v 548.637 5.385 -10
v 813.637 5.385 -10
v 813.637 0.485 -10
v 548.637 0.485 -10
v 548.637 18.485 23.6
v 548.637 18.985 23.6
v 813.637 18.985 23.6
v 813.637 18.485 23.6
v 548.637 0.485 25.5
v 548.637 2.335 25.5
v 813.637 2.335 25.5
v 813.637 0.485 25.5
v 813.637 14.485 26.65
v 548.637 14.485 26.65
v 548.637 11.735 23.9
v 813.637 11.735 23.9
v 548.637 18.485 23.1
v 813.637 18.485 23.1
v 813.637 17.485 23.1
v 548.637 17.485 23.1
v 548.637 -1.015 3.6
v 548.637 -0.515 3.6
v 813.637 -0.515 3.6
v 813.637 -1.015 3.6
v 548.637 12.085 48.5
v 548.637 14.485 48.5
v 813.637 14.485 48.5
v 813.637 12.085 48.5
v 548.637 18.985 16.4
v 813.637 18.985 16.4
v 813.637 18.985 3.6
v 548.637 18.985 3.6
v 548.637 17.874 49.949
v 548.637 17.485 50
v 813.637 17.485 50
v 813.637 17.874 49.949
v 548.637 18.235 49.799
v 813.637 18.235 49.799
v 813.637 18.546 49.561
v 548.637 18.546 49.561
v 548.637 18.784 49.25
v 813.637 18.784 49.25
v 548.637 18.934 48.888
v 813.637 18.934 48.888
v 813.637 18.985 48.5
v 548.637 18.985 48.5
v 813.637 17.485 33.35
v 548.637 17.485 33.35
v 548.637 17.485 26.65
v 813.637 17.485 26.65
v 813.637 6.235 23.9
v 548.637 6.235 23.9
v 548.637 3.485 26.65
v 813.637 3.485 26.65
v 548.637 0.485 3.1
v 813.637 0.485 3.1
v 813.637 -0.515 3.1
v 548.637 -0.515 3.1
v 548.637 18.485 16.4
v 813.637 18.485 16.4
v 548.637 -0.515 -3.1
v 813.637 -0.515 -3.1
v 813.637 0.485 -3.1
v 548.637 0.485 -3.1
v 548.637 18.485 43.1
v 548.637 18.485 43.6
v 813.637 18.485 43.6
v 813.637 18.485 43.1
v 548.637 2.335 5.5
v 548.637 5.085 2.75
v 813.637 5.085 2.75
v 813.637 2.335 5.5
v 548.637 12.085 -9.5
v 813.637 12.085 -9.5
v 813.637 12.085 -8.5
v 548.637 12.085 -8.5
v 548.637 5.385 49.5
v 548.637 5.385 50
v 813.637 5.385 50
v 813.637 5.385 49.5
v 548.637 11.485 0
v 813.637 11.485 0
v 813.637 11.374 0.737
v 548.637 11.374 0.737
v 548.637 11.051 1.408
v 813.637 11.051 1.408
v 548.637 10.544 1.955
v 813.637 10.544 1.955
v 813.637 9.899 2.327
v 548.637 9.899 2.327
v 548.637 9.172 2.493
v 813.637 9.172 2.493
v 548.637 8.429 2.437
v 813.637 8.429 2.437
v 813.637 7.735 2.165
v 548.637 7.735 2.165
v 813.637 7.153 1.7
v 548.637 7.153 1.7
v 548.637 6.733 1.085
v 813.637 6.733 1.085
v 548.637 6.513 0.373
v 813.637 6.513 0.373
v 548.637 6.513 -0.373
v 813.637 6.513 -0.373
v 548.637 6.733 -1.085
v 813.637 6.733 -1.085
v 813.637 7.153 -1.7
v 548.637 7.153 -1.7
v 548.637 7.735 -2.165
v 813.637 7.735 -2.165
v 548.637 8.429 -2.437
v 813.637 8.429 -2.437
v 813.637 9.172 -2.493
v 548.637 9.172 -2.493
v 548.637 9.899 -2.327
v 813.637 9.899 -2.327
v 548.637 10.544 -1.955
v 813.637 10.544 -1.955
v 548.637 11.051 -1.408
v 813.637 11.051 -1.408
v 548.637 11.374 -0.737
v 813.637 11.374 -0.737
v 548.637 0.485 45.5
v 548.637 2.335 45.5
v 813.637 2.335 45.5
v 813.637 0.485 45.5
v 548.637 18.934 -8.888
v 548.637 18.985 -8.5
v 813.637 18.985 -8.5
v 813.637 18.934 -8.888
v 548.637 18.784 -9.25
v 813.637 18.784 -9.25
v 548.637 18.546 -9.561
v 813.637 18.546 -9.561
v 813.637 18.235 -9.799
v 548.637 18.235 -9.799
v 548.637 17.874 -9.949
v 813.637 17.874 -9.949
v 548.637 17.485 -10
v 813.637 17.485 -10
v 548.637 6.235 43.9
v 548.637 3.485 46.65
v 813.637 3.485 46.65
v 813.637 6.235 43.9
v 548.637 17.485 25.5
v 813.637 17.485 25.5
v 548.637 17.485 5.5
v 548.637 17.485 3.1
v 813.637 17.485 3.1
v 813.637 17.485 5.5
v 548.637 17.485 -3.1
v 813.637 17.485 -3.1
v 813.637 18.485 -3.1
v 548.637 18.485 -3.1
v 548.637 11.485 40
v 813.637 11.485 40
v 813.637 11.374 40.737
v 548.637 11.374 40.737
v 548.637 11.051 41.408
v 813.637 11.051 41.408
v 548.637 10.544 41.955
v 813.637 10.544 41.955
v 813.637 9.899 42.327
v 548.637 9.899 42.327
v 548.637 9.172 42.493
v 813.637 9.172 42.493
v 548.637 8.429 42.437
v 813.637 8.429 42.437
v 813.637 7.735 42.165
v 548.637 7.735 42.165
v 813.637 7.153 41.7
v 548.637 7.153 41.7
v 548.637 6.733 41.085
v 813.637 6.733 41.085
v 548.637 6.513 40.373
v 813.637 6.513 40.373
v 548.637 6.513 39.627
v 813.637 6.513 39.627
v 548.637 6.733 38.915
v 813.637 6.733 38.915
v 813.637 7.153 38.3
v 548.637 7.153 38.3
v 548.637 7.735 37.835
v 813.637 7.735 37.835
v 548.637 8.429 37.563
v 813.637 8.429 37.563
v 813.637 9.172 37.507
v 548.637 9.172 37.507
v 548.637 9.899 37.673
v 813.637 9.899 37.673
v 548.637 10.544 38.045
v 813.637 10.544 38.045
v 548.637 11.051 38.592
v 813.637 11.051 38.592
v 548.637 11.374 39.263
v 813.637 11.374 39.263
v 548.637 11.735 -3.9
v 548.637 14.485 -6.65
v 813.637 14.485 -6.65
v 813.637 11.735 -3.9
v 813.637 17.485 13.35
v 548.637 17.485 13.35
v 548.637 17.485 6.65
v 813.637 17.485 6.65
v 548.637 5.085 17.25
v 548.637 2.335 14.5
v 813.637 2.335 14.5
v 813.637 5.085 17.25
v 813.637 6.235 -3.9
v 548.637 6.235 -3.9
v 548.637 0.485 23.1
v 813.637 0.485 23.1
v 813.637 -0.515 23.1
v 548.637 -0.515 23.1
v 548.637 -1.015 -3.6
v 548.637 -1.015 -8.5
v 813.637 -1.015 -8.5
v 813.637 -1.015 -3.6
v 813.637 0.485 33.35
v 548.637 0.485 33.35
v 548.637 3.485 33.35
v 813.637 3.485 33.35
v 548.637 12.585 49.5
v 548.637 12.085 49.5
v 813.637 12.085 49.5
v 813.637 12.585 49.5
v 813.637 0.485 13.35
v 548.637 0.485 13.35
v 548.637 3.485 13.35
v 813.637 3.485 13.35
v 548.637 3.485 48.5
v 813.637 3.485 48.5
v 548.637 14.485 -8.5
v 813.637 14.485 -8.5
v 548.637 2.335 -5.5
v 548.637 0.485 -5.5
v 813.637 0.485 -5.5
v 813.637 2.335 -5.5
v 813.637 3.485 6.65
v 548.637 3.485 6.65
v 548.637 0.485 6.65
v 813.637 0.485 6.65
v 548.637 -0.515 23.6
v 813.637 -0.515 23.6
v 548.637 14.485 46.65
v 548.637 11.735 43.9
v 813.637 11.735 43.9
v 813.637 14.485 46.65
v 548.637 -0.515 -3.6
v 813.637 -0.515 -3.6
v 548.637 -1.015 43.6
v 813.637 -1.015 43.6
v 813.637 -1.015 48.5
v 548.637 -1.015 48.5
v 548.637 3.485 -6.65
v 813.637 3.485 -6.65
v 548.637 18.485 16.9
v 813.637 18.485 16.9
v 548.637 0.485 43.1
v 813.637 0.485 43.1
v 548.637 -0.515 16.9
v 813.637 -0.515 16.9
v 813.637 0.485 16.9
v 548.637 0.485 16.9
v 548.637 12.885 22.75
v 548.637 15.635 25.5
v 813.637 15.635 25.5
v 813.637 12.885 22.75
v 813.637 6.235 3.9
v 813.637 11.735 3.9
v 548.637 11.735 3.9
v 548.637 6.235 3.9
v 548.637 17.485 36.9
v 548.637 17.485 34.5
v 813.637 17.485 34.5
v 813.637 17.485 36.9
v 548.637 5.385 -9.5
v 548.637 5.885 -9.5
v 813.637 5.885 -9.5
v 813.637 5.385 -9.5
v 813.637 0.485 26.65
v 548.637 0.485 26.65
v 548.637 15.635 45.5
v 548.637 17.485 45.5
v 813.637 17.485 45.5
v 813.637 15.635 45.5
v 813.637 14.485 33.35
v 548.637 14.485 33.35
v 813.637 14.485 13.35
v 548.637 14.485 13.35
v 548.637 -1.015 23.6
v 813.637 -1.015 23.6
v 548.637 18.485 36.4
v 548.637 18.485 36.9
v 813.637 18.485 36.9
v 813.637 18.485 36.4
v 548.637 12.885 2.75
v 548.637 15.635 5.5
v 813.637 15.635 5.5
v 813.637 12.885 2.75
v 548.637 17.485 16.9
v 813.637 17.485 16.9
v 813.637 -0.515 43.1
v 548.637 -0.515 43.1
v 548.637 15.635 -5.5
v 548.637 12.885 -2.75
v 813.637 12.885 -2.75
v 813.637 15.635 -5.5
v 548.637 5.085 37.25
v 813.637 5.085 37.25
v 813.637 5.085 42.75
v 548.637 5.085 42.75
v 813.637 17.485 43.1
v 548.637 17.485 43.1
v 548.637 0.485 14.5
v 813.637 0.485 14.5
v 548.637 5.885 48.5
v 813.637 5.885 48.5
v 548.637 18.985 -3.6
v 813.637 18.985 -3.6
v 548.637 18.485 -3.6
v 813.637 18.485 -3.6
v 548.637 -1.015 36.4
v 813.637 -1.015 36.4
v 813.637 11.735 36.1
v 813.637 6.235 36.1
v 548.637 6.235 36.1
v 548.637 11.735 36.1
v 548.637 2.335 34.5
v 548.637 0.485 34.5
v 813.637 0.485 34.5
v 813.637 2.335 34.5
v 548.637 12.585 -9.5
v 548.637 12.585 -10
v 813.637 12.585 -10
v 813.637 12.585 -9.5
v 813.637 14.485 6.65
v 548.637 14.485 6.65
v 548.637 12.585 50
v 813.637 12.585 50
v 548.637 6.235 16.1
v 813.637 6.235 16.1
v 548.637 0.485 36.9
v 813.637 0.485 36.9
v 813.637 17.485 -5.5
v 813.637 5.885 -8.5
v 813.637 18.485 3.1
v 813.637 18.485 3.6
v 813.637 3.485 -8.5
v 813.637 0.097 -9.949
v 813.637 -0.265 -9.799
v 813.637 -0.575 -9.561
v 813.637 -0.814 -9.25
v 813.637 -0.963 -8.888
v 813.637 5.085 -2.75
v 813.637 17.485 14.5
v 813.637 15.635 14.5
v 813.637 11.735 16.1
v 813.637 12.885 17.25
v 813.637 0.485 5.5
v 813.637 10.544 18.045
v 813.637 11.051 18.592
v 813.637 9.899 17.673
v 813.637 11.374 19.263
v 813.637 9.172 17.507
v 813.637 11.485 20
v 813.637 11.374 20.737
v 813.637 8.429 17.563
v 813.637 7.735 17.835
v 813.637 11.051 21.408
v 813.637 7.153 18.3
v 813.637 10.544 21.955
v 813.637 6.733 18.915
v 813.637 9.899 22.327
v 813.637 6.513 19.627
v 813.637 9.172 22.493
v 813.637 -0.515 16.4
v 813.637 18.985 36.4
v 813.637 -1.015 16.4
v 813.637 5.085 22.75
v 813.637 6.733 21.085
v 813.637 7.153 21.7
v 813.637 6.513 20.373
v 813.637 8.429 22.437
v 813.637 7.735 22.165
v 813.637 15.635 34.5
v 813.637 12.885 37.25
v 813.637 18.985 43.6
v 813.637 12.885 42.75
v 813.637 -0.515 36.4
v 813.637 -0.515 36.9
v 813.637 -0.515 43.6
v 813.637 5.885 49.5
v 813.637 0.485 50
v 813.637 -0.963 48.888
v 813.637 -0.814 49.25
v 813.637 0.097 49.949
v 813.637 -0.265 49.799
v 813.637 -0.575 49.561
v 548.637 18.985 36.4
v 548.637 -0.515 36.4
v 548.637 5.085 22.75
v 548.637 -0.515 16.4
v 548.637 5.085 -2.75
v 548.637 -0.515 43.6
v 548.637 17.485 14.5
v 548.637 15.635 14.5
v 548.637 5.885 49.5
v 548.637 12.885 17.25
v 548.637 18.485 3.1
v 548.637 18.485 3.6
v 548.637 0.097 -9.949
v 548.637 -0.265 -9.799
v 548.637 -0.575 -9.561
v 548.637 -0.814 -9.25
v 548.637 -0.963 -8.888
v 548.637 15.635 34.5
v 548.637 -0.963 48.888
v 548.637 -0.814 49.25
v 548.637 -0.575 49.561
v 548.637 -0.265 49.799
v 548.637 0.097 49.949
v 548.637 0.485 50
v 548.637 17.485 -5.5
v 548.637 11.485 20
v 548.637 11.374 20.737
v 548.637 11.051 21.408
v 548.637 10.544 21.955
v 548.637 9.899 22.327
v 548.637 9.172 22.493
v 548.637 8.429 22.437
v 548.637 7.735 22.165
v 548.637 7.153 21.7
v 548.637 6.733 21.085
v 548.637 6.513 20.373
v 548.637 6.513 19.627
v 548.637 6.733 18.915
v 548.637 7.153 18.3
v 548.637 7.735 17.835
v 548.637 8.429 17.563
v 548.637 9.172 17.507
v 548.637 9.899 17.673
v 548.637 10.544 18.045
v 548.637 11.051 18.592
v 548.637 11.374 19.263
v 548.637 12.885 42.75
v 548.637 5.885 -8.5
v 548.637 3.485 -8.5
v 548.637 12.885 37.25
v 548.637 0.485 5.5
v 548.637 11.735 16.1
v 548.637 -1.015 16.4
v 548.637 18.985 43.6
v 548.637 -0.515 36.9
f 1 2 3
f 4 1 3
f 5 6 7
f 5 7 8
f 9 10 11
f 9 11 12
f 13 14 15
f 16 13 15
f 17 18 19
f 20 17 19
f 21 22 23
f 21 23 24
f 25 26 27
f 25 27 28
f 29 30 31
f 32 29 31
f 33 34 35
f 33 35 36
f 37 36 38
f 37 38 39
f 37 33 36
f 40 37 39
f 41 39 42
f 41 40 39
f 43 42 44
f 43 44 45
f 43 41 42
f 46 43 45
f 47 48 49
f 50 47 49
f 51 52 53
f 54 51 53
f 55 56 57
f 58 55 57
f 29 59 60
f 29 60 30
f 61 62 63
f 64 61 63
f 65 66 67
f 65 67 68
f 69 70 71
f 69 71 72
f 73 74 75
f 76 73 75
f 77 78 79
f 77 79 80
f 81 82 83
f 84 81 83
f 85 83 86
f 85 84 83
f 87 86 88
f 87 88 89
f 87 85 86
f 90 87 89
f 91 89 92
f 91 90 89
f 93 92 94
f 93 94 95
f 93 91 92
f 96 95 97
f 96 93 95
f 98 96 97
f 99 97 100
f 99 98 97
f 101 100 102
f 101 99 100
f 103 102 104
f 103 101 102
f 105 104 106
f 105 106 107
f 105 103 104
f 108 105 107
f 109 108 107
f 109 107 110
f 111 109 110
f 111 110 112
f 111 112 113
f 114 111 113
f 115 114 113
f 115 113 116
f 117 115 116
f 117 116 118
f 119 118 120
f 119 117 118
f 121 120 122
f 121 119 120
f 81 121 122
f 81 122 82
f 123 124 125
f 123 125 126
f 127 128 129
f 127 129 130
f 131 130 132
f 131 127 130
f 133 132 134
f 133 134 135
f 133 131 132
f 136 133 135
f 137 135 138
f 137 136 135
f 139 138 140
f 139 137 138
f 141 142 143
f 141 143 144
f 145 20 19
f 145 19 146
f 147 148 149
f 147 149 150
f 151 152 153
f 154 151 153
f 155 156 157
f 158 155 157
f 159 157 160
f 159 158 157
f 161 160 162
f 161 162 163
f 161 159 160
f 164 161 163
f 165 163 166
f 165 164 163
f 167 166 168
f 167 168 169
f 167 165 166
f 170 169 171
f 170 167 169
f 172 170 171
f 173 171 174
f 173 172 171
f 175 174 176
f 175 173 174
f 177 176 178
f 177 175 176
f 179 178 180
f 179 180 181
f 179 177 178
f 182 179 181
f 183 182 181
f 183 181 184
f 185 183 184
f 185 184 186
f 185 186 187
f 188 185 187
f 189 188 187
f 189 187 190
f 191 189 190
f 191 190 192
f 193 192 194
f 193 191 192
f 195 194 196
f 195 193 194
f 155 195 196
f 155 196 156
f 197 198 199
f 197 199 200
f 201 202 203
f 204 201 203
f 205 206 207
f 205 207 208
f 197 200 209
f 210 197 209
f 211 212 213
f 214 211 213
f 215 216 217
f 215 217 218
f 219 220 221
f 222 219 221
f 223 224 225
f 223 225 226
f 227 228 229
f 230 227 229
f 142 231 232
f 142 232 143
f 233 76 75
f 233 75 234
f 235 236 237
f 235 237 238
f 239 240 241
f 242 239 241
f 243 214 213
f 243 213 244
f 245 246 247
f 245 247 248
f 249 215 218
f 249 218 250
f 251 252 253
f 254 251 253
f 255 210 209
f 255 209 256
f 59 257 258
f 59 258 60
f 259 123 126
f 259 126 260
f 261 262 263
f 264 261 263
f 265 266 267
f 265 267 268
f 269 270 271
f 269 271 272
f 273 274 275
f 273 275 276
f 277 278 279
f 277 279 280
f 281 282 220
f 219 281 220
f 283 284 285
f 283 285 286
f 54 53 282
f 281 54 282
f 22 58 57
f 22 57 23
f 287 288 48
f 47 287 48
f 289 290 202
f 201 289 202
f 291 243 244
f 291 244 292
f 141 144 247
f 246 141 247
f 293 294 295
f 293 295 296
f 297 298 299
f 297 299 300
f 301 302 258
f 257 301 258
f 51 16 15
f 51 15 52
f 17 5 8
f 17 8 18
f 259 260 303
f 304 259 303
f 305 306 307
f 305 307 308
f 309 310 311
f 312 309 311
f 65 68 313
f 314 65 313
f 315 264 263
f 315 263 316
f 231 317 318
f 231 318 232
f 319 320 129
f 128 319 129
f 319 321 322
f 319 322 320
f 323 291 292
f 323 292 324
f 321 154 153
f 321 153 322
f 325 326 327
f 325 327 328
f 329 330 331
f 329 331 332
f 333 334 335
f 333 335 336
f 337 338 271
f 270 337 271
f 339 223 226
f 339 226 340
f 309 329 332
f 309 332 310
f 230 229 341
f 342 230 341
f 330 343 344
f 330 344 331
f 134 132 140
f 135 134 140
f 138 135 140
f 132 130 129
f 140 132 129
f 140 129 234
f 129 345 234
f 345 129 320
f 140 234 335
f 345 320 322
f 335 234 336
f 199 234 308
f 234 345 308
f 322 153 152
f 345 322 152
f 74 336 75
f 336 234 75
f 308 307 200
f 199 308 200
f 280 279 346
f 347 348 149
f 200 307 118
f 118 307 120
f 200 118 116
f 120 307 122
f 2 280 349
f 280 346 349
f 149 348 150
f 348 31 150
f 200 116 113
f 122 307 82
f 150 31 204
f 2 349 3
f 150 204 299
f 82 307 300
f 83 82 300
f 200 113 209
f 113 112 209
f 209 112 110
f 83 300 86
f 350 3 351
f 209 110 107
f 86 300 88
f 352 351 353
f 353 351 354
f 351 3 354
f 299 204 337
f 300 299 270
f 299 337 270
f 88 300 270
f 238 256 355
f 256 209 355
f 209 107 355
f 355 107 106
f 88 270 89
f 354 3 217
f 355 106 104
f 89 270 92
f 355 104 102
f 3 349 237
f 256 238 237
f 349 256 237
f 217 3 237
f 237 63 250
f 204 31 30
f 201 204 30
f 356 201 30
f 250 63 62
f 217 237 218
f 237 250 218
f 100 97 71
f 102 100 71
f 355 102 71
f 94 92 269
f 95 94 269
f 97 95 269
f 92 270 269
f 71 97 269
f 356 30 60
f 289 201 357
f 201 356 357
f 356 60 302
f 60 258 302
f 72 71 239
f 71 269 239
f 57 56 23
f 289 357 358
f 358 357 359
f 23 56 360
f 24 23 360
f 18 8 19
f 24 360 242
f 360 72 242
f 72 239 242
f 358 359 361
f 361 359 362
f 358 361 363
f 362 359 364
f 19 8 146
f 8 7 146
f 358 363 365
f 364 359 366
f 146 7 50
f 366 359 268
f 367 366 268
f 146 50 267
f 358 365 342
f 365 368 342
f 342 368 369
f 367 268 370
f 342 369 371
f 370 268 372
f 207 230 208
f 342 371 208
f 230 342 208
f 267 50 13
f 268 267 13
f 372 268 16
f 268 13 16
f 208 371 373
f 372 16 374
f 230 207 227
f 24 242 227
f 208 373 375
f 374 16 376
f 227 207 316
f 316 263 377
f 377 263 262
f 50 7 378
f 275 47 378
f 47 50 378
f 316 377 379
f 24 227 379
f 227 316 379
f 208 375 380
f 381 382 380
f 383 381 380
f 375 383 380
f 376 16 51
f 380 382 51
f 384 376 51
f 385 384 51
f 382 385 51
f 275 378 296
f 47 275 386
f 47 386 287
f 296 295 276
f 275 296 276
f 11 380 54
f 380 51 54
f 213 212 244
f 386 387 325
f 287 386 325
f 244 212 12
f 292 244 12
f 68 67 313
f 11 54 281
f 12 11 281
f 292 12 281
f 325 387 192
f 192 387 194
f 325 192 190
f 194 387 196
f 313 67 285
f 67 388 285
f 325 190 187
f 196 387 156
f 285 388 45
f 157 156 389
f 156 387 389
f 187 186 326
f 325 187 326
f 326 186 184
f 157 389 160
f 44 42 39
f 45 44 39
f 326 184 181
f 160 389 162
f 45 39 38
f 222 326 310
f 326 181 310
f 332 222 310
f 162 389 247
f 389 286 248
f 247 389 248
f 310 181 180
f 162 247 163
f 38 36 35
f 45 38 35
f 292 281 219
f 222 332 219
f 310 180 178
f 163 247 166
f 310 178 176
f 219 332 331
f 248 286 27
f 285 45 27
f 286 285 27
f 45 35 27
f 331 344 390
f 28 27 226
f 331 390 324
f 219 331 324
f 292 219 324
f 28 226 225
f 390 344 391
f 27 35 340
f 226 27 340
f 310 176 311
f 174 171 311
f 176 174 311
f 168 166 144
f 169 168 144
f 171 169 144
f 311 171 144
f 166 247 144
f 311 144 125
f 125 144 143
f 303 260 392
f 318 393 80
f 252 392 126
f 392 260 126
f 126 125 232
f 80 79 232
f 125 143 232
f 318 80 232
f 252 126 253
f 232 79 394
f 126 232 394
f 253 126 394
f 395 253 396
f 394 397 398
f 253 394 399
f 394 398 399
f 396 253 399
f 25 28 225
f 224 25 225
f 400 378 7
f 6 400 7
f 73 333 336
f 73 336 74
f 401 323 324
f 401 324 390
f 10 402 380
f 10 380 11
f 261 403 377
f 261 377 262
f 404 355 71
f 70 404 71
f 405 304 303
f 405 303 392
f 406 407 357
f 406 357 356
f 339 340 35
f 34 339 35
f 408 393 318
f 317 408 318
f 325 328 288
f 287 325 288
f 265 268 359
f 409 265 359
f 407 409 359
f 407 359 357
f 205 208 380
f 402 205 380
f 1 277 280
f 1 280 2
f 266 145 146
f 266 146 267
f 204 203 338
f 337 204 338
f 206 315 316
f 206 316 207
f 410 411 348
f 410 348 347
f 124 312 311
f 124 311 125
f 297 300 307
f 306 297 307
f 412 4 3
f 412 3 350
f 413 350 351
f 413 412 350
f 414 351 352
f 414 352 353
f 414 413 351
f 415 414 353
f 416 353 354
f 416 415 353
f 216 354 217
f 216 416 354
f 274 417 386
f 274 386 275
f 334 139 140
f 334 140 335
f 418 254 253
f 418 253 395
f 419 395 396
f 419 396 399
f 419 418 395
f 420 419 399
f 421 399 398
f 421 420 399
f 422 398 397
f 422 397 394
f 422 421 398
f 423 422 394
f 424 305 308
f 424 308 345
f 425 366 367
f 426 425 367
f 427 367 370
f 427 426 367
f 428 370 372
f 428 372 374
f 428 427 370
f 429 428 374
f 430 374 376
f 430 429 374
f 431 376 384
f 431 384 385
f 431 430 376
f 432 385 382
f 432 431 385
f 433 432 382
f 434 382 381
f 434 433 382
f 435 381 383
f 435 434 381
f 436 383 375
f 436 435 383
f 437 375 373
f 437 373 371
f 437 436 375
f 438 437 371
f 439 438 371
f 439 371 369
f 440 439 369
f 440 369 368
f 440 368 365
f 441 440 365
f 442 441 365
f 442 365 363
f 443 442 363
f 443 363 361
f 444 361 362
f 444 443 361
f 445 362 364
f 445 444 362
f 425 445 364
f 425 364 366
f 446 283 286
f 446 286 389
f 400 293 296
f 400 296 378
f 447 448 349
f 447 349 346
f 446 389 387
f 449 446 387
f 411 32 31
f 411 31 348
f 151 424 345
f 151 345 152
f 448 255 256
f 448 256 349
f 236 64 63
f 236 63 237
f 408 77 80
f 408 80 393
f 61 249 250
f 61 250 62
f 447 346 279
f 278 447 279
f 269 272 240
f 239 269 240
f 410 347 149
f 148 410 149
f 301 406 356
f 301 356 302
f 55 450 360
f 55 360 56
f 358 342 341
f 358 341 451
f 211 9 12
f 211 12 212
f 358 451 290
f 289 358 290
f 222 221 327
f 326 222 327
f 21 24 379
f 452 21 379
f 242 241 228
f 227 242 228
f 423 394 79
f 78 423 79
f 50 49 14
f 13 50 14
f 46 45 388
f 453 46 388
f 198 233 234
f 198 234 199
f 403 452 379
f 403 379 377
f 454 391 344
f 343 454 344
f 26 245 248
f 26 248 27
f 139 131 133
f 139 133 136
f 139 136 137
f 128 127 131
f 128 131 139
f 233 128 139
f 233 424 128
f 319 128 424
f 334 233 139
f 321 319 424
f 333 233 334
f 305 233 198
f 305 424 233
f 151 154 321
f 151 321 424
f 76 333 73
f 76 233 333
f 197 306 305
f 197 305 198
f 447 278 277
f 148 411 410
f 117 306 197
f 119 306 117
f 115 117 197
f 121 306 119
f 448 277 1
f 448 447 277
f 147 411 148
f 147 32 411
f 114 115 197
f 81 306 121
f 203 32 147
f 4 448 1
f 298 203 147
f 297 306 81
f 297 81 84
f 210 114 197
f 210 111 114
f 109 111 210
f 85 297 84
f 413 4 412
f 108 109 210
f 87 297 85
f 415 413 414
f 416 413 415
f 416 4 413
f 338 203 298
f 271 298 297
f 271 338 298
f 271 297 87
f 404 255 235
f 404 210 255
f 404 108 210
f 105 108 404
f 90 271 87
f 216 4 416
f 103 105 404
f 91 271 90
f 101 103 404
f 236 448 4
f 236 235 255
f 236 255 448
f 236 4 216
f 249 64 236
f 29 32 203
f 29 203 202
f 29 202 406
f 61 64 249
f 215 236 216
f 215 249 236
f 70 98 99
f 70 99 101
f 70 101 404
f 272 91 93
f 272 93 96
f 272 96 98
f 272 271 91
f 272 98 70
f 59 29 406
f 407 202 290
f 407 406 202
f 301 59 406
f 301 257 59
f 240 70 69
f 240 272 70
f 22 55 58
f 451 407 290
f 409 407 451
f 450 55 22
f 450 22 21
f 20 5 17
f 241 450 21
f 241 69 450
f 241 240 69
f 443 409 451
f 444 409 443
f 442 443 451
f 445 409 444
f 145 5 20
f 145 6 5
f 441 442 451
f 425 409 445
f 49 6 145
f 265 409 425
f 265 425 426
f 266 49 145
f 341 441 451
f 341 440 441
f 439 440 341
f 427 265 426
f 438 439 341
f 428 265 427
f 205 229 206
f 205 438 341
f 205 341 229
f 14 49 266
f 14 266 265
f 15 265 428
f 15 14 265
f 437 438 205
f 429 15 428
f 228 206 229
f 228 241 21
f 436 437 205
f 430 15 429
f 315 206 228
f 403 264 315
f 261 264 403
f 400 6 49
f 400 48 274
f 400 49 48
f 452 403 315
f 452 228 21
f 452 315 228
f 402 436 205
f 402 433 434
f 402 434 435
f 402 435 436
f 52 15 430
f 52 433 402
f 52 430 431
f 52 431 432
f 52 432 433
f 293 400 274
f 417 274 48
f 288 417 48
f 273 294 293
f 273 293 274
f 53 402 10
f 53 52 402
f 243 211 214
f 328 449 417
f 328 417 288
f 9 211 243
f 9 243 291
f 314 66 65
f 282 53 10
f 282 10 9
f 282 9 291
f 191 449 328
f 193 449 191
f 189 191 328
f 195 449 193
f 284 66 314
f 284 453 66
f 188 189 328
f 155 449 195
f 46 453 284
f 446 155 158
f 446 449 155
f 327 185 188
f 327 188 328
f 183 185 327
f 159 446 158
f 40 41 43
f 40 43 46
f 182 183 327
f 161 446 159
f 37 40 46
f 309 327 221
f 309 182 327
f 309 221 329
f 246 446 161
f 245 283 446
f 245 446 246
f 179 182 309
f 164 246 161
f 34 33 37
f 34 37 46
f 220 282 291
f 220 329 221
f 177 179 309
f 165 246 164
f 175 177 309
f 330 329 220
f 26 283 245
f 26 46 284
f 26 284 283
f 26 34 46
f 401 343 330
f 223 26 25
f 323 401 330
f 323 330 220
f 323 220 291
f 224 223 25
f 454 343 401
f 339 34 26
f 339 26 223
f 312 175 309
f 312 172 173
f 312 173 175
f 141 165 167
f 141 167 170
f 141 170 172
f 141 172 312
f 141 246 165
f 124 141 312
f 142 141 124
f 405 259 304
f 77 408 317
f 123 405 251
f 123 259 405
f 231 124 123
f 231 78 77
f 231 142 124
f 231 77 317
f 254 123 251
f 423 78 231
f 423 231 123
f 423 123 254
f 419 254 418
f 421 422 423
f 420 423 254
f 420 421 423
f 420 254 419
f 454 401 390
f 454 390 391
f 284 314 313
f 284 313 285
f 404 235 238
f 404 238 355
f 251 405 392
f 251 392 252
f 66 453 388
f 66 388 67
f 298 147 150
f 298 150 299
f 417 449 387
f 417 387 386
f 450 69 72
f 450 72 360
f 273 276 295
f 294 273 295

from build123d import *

# Parameters (mm, degrees)
SKETCH1_R                = 2.5
F_20_X_20_X_R1_5_1_DEPTH = 265


with BuildPart() as part:
    # Sketch1 → 铝型材 20 X 20 X R1.5(1) (new body)
    with BuildSketch(Plane(origin=(548.637296324, 8.985389246, 0), x_dir=(0, 1, 0), z_dir=(1, 0, 0))):
        with BuildLine():
            Line((-10, -3.6), (-9.5, -3.6))
            Line((-9.5, -3.6), (-9.5, -3.1))
            Line((-9.5, -3.1), (-8.5, -3.1))
            Line((-8.5, -3.1), (-8.5, -5.5))
            Line((-8.5, -5.5), (-6.65, -5.5))
            Line((-6.65, -5.5), (-3.9, -2.75))
            Line((-3.9, -2.75), (-3.9, 2.75))
            Line((-3.9, 2.75), (-6.65, 5.5))
            Line((-6.65, 5.5), (-8.5, 5.5))
            Line((-8.5, 5.5), (-8.5, 3.1))
            Line((-8.5, 3.1), (-9.5, 3.1))
            Line((-9.5, 3.1), (-9.5, 3.6))
            Line((-9.5, 3.6), (-10, 3.6))
            Line((-10, 3.6), (-10, 8.5))
            Line((-10, 8.5), (-10, 11.5))
            Line((-10, 11.5), (-10, 16.4))
            Line((-10, 16.4), (-9.5, 16.4))
            Line((-9.5, 16.4), (-9.5, 16.9))
            Line((-9.5, 16.9), (-8.5, 16.9))
            Line((-8.5, 16.9), (-8.5, 14.5))
            Line((-8.5, 14.5), (-6.65, 14.5))
            Line((-6.65, 14.5), (-3.9, 17.25))
            Line((-3.9, 17.25), (-3.9, 22.75))
            Line((-3.9, 22.75), (-6.65, 25.5))
            Line((-6.65, 25.5), (-8.5, 25.5))
            Line((-8.5, 25.5), (-8.5, 23.1))
            Line((-8.5, 23.1), (-9.5, 23.1))
            Line((-9.5, 23.1), (-9.5, 23.6))
            Line((-9.5, 23.6), (-10, 23.6))
            Line((-10, 23.6), (-10, 28.5))
            Line((-10, 28.5), (-10, 31.5))
            Line((-10, 31.5), (-10, 36.4))
            Line((-10, 36.4), (-9.5, 36.4))
            Line((-9.5, 36.4), (-9.5, 36.9))
            Line((-9.5, 36.9), (-8.5, 36.9))
            Line((-8.5, 36.9), (-8.5, 34.5))
            Line((-8.5, 34.5), (-6.65, 34.5))
            Line((-6.65, 34.5), (-3.9, 37.25))
            Line((-3.9, 37.25), (-3.9, 42.75))
            Line((-3.9, 42.75), (-6.65, 45.5))
            Line((-6.65, 45.5), (-8.5, 45.5))
            Line((-8.5, 45.5), (-8.5, 43.1))
            Line((-8.5, 43.1), (-9.5, 43.1))
            Line((-9.5, 43.1), (-9.5, 43.6))
            Line((-9.5, 43.6), (-10, 43.6))
            Line((-10, 43.6), (-10, 48.5))
            ThreePointArc((-10, 48.5), (-9.560660172, 49.560660172), (-8.5, 50))
            Line((-8.5, 50), (-3.6, 50))
            Line((-3.6, 50), (-3.6, 49.5))
            Line((-3.6, 49.5), (-3.1, 49.5))
            Line((-3.1, 49.5), (-3.1, 48.5))
            Line((-3.1, 48.5), (-5.5, 48.5))
            Line((-5.5, 48.5), (-5.5, 46.65))
            Line((-5.5, 46.65), (-2.75, 43.9))
            Line((-2.75, 43.9), (2.75, 43.9))
            Line((2.75, 43.9), (5.5, 46.65))
            Line((5.5, 46.65), (5.5, 48.5))
            Line((5.5, 48.5), (3.1, 48.5))
            Line((3.1, 48.5), (3.1, 49.5))
            Line((3.1, 49.5), (3.6, 49.5))
            Line((3.6, 49.5), (3.6, 50))
            Line((3.6, 50), (8.5, 50))
            ThreePointArc((8.5, 50), (9.560660172, 49.560660172), (10, 48.5))
            Line((10, 48.5), (10, 43.6))
            Line((10, 43.6), (9.5, 43.6))
            Line((9.5, 43.6), (9.5, 43.1))
            Line((9.5, 43.1), (8.5, 43.1))
            Line((8.5, 43.1), (8.5, 45.5))
            Line((8.5, 45.5), (6.65, 45.5))
            Line((6.65, 45.5), (3.9, 42.75))
            Line((3.9, 42.75), (3.9, 37.25))
            Line((3.9, 37.25), (6.65, 34.5))
            Line((6.65, 34.5), (8.5, 34.5))
            Line((8.5, 34.5), (8.5, 36.9))
            Line((8.5, 36.9), (9.5, 36.9))
            Line((9.5, 36.9), (9.5, 36.4))
            Line((9.5, 36.4), (10, 36.4))
            Line((10, 36.4), (10, 31.5))
            Line((10, 31.5), (10, 28.5))
            Line((10, 28.5), (10, 23.6))
            Line((10, 23.6), (9.5, 23.6))
            Line((9.5, 23.6), (9.5, 23.1))
            Line((9.5, 23.1), (8.5, 23.1))
            Line((8.5, 23.1), (8.5, 25.5))
            Line((8.5, 25.5), (6.65, 25.5))
            Line((6.65, 25.5), (3.9, 22.75))
            Line((3.9, 22.75), (3.9, 17.25))
            Line((3.9, 17.25), (6.65, 14.5))
            Line((6.65, 14.5), (8.5, 14.5))
            Line((8.5, 14.5), (8.5, 16.9))
            Line((8.5, 16.9), (9.5, 16.9))
            Line((9.5, 16.9), (9.5, 16.4))
            Line((9.5, 16.4), (10, 16.4))
            Line((10, 16.4), (10, 11.5))
            Line((10, 11.5), (10, 8.5))
            Line((10, 8.5), (10, 3.6))
            Line((10, 3.6), (9.5, 3.6))
            Line((9.5, 3.6), (9.5, 3.1))
            Line((9.5, 3.1), (8.5, 3.1))
            Line((8.5, 3.1), (8.5, 5.5))
            Line((8.5, 5.5), (6.65, 5.5))
            Line((6.65, 5.5), (3.9, 2.75))
            Line((3.9, 2.75), (3.9, -2.75))
            Line((3.9, -2.75), (6.65, -5.5))
            Line((6.65, -5.5), (8.5, -5.5))
            Line((8.5, -5.5), (8.5, -3.1))
            Line((8.5, -3.1), (9.5, -3.1))
            Line((9.5, -3.1), (9.5, -3.6))
            Line((9.5, -3.6), (10, -3.6))
            Line((10, -3.6), (10, -8.5))
            ThreePointArc((10, -8.5), (9.560660172, -9.560660172), (8.5, -10))
            Line((8.5, -10), (3.6, -10))
            Line((3.6, -10), (3.6, -9.5))
            Line((3.6, -9.5), (3.1, -9.5))
            Line((3.1, -9.5), (3.1, -8.5))
            Line((3.1, -8.5), (5.5, -8.5))
            Line((5.5, -8.5), (5.5, -6.65))
            Line((5.5, -6.65), (2.75, -3.9))
            Line((2.75, -3.9), (-2.75, -3.9))
            Line((-2.75, -3.9), (-5.5, -6.65))
            Line((-5.5, -6.65), (-5.5, -8.5))
            Line((-5.5, -8.5), (-3.1, -8.5))
            Line((-3.1, -8.5), (-3.1, -9.5))
            Line((-3.1, -9.5), (-3.6, -9.5))
            Line((-3.6, -9.5), (-3.6, -10))
            Line((-3.6, -10), (-8.5, -10))
            ThreePointArc((-8.5, -10), (-9.560660172, -9.560660172), (-10, -8.5))
            Line((-10, -8.5), (-10, -3.6))
        make_face()
        Circle(SKETCH1_R, mode=Mode.SUBTRACT)
        with Locations((0, 20)):
            Circle(SKETCH1_R, mode=Mode.SUBTRACT)
        with Locations((0, 40)):
            Circle(SKETCH1_R, mode=Mode.SUBTRACT)
        Polygon((-5.5, 6.65), (-8.5, 6.65), (-8.5, 13.35), (-5.5, 13.35), (-2.75, 16.1), (2.75, 16.1), (5.5, 13.35), (8.5, 13.35), (8.5, 6.65), (5.5, 6.65), (2.75, 3.9), (-2.75, 3.9), align=None, mode=Mode.SUBTRACT)
        Polygon((-5.5, 26.65), (-8.5, 26.65), (-8.5, 33.35), (-5.5, 33.35), (-2.75, 36.1), (2.75, 36.1), (5.5, 33.35), (8.5, 33.35), (8.5, 26.65), (5.5, 26.65), (2.75, 23.9), (-2.75, 23.9), align=None, mode=Mode.SUBTRACT)
    extrude(amount=F_20_X_20_X_R1_5_1_DEPTH)


solid = part.part
